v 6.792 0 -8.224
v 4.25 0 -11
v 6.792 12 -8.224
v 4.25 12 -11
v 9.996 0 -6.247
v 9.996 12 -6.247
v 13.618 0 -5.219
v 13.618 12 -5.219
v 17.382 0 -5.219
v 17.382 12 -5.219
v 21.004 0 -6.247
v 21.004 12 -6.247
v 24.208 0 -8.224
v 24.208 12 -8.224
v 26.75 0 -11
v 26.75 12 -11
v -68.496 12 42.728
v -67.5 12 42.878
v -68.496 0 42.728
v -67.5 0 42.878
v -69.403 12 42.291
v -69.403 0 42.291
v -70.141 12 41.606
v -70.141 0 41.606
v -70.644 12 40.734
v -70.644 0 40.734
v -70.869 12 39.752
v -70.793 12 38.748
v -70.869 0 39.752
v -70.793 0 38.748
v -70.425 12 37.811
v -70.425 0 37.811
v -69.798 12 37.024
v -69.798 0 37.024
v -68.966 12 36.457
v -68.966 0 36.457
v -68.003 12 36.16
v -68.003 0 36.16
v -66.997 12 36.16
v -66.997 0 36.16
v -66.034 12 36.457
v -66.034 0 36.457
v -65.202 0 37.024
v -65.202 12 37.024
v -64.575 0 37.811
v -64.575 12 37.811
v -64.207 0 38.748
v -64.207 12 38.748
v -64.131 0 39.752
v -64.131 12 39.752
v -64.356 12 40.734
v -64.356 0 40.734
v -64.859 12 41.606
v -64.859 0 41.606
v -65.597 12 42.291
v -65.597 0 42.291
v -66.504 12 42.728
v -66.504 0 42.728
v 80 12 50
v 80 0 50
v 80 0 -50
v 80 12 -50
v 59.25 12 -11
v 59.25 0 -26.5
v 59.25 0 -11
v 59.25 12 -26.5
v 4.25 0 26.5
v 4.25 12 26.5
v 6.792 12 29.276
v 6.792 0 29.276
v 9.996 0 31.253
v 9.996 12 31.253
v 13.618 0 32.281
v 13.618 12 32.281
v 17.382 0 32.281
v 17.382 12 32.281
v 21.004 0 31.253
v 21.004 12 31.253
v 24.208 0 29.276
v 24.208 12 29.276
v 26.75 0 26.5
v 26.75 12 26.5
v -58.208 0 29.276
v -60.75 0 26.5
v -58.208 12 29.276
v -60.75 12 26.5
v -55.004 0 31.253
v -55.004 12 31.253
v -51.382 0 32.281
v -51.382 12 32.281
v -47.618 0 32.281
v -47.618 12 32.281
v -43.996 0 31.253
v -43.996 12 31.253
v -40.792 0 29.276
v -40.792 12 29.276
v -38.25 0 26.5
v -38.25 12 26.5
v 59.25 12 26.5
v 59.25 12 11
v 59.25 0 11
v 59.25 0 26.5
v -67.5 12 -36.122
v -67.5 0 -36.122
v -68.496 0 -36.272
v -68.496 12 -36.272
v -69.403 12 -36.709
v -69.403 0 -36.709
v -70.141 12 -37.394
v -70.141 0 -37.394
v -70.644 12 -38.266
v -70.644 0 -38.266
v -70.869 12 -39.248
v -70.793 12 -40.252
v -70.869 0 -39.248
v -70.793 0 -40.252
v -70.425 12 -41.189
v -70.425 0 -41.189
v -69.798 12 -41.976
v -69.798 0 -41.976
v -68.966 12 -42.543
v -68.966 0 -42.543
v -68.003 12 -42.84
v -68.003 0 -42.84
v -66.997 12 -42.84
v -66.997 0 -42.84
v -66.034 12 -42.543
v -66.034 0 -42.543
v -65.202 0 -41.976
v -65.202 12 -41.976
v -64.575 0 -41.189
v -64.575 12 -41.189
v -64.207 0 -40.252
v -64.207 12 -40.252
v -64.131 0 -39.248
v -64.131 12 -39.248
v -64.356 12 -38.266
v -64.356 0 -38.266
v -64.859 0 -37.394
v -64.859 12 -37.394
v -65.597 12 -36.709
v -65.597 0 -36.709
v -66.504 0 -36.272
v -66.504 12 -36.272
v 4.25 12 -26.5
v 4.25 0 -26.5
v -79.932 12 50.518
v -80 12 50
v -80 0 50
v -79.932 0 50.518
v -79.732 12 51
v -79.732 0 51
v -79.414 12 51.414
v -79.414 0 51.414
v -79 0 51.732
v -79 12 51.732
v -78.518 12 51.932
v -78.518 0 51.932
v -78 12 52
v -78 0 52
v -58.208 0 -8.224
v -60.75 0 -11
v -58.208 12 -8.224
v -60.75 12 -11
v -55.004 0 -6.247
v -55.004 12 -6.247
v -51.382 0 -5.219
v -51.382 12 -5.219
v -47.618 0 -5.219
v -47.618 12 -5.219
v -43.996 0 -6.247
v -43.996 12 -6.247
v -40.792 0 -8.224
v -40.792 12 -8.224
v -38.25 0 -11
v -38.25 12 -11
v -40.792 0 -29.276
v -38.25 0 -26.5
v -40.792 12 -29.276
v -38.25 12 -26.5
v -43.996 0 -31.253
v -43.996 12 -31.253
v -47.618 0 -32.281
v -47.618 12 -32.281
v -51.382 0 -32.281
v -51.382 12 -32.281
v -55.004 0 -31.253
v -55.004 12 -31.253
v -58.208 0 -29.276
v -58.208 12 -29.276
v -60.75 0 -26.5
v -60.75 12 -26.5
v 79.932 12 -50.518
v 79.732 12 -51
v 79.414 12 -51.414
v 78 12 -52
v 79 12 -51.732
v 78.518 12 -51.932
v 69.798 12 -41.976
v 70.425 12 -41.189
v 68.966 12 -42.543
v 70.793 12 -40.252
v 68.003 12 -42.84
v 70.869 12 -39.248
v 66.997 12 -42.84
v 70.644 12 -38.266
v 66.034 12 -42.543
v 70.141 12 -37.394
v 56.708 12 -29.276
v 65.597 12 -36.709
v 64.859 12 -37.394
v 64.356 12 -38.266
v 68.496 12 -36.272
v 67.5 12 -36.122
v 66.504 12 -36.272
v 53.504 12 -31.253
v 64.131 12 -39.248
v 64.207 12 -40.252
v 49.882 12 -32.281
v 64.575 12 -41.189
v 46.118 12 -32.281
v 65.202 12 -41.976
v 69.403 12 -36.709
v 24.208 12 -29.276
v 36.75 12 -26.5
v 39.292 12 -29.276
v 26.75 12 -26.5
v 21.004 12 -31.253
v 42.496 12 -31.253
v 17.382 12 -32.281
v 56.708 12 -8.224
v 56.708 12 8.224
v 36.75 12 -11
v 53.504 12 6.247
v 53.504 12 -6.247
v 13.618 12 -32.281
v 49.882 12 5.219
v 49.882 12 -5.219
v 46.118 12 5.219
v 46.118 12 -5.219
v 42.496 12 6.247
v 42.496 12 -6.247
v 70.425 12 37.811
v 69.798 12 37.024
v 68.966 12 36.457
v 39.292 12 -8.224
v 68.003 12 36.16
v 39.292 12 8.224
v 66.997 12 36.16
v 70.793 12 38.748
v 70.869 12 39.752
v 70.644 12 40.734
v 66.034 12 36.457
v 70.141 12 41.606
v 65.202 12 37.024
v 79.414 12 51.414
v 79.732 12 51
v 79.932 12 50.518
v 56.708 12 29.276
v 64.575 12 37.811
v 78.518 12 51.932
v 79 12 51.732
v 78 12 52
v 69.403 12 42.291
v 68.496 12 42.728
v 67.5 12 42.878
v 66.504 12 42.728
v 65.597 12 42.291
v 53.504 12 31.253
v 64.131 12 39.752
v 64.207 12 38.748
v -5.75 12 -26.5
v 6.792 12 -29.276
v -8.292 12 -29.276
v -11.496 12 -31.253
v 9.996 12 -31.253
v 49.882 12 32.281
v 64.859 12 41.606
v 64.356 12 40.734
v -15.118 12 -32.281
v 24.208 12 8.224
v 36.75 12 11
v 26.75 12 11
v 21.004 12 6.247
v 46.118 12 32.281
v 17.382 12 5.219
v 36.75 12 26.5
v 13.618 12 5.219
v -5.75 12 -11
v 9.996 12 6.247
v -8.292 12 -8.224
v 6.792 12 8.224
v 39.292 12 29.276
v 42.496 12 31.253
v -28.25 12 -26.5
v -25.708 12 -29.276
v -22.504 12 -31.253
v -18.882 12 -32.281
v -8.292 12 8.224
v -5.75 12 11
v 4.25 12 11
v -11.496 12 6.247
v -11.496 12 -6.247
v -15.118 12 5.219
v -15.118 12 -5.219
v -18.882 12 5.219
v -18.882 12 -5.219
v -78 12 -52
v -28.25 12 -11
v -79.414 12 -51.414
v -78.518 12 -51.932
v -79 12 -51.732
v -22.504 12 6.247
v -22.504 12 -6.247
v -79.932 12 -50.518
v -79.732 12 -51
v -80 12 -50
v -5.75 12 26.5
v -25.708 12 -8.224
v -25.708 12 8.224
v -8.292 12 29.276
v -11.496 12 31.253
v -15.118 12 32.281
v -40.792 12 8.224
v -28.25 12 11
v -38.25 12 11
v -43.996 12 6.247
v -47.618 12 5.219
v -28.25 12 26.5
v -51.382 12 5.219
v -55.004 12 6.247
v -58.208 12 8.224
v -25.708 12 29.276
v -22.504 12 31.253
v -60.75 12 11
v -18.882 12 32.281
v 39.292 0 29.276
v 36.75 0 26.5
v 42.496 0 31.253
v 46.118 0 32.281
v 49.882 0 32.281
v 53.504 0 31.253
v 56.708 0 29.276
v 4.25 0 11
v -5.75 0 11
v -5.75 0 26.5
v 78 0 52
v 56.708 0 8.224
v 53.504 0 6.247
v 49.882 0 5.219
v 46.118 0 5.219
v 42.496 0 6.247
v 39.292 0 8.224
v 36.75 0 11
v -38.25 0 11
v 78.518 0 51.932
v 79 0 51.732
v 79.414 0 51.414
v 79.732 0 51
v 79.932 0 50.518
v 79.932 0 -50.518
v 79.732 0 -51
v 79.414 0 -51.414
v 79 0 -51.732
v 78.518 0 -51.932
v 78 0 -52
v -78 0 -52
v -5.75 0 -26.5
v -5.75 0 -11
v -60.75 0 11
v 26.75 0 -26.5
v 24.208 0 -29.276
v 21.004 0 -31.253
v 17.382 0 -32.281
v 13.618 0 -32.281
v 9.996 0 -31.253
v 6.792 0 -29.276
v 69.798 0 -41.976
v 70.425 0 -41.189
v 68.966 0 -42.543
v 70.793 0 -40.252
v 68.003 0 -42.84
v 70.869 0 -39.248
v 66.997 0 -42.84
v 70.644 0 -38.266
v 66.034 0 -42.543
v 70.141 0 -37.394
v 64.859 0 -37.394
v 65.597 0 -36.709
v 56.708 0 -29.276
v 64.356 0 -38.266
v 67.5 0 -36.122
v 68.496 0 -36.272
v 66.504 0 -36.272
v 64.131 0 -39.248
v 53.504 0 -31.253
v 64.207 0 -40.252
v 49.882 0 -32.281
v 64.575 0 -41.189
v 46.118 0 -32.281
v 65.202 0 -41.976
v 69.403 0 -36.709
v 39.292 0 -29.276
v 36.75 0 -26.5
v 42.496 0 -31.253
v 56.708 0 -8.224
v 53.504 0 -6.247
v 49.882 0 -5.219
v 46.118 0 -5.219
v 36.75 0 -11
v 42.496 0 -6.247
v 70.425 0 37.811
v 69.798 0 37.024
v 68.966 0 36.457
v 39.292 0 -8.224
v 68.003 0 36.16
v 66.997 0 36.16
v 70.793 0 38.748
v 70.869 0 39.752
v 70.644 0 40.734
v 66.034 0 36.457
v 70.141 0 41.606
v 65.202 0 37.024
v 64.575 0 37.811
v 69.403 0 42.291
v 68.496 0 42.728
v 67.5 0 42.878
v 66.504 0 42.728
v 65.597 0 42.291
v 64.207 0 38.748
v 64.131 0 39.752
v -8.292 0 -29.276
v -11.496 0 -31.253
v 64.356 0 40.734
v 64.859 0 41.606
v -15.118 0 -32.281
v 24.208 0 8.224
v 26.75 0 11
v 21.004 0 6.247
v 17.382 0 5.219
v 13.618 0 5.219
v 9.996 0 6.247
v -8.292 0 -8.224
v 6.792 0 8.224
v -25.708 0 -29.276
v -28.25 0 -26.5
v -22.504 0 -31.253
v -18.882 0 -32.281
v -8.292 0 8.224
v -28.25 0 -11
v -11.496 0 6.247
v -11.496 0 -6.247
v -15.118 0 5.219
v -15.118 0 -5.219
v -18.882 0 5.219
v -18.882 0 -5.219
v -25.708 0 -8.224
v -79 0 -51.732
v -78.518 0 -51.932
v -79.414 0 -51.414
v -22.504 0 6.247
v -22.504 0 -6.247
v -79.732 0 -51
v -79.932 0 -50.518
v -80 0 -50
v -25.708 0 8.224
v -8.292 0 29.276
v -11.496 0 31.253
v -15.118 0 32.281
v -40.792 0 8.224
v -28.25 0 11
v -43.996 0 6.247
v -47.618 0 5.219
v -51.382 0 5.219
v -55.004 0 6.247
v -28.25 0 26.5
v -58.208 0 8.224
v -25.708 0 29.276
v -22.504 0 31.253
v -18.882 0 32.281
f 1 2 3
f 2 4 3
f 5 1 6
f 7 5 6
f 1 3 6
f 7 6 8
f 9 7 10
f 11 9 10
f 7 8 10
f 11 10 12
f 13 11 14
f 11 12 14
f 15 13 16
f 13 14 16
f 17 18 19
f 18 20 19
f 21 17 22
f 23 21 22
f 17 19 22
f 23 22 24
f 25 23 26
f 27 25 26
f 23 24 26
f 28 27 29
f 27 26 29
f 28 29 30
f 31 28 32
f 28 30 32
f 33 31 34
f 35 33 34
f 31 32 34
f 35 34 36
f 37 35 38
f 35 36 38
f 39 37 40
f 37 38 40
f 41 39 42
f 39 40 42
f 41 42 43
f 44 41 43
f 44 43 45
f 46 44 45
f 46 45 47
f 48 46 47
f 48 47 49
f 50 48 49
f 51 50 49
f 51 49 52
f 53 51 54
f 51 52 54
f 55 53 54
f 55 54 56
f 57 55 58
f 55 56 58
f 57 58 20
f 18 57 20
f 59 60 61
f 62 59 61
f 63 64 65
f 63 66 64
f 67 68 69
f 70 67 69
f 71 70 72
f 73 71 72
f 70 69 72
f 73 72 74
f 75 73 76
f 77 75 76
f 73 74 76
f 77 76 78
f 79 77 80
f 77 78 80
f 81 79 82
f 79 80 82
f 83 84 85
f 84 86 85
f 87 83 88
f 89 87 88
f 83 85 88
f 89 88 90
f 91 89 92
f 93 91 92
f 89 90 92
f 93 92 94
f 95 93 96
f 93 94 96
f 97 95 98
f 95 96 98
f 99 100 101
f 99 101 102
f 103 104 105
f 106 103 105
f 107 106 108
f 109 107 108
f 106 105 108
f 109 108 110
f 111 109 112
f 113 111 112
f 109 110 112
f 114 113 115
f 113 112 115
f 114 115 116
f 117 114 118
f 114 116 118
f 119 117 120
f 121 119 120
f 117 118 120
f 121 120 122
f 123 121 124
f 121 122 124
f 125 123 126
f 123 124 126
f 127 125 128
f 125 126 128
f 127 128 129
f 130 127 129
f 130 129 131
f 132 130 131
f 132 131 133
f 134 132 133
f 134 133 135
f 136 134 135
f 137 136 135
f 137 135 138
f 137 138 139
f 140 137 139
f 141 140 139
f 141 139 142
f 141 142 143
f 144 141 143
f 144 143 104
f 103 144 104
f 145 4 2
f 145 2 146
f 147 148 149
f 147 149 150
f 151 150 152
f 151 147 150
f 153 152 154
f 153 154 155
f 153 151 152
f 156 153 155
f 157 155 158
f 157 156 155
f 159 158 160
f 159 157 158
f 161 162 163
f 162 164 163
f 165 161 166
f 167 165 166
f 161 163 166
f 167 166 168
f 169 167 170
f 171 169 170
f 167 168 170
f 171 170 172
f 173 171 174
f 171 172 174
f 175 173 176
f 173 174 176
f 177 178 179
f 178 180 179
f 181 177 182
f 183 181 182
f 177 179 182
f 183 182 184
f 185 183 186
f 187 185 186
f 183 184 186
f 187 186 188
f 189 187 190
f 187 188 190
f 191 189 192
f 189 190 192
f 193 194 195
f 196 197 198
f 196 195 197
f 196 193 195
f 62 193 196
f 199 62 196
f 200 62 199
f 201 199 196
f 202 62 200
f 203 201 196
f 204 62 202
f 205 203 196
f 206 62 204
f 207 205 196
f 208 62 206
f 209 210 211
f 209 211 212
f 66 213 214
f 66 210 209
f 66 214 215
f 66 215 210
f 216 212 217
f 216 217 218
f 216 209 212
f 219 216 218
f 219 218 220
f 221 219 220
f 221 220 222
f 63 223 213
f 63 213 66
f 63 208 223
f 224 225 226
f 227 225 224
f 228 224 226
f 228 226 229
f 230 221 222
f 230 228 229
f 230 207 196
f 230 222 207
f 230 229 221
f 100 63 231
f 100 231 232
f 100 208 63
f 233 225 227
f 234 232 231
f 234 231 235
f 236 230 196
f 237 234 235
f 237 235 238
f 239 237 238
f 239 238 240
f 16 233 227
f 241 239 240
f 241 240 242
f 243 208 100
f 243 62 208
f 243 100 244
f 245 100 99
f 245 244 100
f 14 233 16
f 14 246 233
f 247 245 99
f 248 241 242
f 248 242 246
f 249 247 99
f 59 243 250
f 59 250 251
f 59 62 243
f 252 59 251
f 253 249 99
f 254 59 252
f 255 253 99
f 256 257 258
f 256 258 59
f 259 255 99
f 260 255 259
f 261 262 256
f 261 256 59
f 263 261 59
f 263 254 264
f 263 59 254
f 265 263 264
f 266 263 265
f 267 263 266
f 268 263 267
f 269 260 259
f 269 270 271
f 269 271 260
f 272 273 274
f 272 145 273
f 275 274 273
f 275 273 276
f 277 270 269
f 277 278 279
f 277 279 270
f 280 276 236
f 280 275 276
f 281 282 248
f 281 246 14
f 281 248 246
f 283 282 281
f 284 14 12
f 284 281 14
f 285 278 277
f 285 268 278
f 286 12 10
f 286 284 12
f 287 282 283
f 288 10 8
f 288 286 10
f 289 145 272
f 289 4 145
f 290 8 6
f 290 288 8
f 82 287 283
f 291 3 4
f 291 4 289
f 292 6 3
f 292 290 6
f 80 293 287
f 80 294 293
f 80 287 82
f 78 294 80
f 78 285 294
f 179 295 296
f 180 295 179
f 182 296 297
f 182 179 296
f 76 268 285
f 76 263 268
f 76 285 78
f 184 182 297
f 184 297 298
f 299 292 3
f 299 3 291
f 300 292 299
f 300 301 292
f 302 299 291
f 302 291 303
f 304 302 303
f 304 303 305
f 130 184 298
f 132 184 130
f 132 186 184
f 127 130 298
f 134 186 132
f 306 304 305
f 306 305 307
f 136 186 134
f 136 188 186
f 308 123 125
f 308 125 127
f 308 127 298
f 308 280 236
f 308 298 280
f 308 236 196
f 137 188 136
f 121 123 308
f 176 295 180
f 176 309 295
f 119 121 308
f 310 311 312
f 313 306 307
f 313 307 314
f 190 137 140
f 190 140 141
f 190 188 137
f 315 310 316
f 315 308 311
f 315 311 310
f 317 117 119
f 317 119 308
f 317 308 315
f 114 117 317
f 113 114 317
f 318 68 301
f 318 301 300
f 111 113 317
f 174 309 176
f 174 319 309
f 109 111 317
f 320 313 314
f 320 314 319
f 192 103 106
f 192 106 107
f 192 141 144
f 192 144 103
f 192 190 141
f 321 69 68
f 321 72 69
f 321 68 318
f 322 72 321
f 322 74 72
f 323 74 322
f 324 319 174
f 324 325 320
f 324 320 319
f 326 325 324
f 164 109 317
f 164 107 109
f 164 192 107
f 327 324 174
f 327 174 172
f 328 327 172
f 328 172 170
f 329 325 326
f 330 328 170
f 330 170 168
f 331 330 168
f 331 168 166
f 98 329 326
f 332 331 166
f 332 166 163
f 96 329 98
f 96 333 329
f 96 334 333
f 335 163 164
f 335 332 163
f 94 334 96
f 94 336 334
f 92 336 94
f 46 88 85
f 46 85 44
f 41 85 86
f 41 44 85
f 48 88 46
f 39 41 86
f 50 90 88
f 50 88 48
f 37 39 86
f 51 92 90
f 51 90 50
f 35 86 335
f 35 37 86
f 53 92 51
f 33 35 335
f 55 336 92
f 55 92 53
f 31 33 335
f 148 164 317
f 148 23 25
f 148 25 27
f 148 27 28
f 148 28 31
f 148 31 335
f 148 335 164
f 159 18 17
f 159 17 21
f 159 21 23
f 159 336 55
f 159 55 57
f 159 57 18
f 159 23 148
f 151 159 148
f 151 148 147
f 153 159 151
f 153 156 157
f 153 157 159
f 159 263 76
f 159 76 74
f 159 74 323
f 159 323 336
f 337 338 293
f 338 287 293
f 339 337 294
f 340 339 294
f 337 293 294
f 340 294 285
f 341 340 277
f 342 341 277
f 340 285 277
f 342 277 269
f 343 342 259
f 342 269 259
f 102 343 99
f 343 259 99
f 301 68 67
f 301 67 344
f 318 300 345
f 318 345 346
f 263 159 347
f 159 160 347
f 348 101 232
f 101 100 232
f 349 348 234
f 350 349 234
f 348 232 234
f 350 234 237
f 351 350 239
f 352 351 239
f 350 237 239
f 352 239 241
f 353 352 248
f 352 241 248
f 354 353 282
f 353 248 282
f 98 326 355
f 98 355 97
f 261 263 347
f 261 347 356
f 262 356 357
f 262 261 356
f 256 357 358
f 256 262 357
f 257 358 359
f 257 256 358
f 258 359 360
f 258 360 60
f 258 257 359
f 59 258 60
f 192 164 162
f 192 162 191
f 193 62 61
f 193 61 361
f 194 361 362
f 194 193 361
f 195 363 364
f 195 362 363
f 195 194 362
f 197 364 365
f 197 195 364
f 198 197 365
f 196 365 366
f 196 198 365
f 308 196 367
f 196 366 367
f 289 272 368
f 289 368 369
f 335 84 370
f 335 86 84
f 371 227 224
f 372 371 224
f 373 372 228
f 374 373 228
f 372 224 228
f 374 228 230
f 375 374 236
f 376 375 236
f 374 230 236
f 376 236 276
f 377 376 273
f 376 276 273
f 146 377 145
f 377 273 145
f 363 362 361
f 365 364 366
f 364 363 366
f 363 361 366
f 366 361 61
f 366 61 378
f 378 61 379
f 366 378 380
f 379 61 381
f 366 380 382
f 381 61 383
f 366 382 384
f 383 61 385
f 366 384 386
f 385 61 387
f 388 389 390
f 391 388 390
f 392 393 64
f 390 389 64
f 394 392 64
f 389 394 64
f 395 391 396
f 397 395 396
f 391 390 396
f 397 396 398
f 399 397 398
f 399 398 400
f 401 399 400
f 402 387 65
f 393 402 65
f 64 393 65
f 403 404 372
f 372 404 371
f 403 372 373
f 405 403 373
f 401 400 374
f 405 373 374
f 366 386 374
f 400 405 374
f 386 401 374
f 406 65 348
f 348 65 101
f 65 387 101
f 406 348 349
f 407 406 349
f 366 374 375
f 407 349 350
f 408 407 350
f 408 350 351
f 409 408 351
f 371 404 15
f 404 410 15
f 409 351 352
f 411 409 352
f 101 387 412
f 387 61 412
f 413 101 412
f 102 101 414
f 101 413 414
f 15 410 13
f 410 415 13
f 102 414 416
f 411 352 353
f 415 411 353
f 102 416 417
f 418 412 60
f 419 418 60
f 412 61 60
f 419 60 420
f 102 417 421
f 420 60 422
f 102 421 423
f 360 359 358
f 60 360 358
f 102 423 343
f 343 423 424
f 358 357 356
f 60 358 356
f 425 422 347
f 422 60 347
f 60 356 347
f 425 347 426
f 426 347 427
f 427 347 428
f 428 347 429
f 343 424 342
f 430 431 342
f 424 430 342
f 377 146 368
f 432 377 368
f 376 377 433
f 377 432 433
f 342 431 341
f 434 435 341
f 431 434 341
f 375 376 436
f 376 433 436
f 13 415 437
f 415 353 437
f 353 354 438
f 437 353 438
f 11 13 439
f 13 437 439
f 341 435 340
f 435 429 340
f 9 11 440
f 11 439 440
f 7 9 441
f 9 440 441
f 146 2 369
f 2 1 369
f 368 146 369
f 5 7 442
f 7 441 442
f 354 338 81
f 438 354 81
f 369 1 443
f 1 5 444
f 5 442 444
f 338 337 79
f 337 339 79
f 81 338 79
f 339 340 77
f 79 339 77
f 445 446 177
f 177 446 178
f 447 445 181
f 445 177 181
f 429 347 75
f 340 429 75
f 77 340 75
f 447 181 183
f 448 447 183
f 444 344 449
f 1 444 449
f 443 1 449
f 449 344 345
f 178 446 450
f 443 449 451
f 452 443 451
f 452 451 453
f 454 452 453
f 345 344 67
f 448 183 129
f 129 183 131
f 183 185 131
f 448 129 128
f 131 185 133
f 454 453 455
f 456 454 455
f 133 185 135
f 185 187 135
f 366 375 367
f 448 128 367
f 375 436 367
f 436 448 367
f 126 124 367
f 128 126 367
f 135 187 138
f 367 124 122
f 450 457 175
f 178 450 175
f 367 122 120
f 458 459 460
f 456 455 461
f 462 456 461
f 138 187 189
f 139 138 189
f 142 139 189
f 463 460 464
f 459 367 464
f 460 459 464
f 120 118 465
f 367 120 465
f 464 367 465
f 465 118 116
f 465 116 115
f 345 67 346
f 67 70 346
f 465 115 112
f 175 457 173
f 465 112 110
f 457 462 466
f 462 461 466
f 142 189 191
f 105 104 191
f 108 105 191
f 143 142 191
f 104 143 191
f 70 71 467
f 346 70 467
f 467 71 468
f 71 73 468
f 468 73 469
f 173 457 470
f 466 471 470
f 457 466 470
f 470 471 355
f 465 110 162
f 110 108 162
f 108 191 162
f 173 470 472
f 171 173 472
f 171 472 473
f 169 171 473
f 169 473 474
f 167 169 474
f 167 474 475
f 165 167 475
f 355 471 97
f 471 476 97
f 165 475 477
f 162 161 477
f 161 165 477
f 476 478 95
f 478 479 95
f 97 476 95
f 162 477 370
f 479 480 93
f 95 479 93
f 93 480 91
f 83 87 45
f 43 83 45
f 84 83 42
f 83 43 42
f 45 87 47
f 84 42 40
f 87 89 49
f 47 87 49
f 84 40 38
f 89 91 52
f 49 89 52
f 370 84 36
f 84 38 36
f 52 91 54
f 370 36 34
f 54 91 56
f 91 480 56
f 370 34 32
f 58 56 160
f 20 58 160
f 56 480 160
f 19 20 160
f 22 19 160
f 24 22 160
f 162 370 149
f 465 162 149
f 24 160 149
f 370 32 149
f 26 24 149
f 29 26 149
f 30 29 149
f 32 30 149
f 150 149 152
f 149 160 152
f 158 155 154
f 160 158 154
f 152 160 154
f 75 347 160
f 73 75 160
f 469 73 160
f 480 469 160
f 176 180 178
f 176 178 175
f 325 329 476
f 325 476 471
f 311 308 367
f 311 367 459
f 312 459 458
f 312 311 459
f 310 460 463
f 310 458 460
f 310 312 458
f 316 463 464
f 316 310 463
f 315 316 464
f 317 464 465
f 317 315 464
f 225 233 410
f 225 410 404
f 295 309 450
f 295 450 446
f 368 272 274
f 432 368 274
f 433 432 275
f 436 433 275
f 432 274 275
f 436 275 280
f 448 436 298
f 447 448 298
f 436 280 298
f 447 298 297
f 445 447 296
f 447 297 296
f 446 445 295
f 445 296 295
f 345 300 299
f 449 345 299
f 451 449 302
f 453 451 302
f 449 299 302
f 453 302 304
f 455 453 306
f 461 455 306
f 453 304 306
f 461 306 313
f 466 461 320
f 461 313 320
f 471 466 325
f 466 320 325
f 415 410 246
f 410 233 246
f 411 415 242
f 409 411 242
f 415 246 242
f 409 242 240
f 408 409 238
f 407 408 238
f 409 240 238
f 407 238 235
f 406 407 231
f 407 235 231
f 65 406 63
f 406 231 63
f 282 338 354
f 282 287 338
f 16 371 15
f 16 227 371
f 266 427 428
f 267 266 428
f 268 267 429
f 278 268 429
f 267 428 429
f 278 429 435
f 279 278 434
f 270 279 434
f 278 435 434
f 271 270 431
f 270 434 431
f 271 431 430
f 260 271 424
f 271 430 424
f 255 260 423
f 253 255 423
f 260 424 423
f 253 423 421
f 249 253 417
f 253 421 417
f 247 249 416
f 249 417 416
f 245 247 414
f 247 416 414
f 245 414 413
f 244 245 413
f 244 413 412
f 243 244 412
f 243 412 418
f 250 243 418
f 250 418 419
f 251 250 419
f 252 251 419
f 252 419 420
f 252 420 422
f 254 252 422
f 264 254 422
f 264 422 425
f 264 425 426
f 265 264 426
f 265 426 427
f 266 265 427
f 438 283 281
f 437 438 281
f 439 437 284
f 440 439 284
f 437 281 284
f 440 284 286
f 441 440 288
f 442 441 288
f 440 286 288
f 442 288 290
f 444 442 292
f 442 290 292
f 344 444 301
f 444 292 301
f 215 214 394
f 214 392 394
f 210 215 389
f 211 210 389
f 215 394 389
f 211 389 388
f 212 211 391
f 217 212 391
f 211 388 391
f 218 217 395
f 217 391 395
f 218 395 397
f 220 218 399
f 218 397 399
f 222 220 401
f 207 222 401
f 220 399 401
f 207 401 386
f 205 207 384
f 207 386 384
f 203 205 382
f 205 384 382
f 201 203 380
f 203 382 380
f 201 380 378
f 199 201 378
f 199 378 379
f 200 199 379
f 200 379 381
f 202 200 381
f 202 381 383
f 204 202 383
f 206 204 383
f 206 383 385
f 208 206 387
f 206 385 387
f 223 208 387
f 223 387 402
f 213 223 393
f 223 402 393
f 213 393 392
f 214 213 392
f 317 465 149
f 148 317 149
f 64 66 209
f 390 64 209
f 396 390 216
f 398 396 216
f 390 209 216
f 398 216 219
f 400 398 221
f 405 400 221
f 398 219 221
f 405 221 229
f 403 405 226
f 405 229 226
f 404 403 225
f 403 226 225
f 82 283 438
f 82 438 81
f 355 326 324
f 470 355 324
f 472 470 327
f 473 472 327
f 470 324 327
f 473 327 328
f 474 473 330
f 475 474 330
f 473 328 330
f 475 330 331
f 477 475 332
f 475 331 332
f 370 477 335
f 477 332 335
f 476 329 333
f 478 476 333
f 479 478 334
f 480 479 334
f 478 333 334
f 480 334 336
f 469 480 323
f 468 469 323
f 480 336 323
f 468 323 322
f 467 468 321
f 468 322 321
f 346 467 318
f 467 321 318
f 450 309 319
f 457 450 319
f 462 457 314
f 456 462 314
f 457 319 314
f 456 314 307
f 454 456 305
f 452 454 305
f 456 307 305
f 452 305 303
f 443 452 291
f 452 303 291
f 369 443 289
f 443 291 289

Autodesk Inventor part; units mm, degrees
ref_plane "YZ Plane" through (0, 0, 0) normal (1, 0, 0) x (0, 1, 0)
ref_plane "XZ Plane" through (0, 0, 0) normal (0, 1, 0) x (-1, 0, 0)
ref_plane "XY Plane" through (0, 0, 0) normal (0, 0, 1) x (1, 0, 0)
sketch "Sketch1" plane through (0, 0, 0) normal (0, 1, 0) x (-1, 0, 0)
  line L0 (80, 52) -> (-80, 52)
  line L1 (-80, 52) -> (-80, -52)
  line L2 (-80, -52) -> (80, -52)
  line L3 (80, -52) -> (80, 52)
  line L4 (80, 52) -> (-80, -52) construction
  line L5 (-80, 52) -> (80, -52) construction
  point P0 (0, 0)
  dimension "d0" = 160
  dimension "d1" = 104
extrude "Extrusion1" add sketch "Sketch1" along normal blind 12
sketch "Sketch2" plane through (0, 12, 0) normal (0, 1, 0) x (1, 0, 0)
  line L0 (-80, 52) -> (-80, -52) projected
  line L1 (80, 52) -> (-80, 52) projected
  line L2 (-38.25, 26.5) -> (-38.25, 11)
  line L3 (-60.75, 11) -> (-60.75, 26.5)
  arc A0 (-38.25, 26.5) -> (-60.75, 26.5) centre (-49.5, 18.75) ccw
  arc A1 (-60.75, 11) -> (-38.25, 11) centre (-49.5, 18.75) ccw
  point P0 (0, 0)
  dimension "d33" = 22.5
  dimension "d34" = 15.5
  dimension "d35" = 19.25
  dimension "d37" = 33.25
  dimension "d38" = 7.75
extrude "Extrusion2" cut sketch "Sketch2" against normal up to next
pattern_linear "Rectangular Pattern1" count 4 spacing -32.5 along (-1, 0, 0) count 2 spacing 37.5 along (0, 0, 1) of "Extrusion2"
sketch "Sketch4" plane through (0, 12, 0) normal (0, 1, 0) x (1, 0, 0)
  line L0 (-80, 52) -> (-80, -52) projected
  line L1 (80, 52) -> (-80, 52) projected
  line L2 (80, -52) -> (80, 52) projected
  line L3 (-80, -52) -> (80, -52) projected
  point P0 (0, 0)
  point P1 (-67.5, 39.5)
  point P2 (67.5, 39.5)
  point P3 (67.5, -39.5)
  point P4 (-67.5, -39.5)
  dimension "d24" = 12.5
  dimension "d25" = 12.5
  dimension "d26" = 12.5
  dimension "d27" = 12.5
  dimension "d28" = 12.5
  dimension "d29" = 12.5
  dimension "d30" = 12.5
  dimension "d31" = 12.5
hole "Hole1" at (-67.5, 12, -39.5) at (67.5, 12, -39.5) at (67.5, 12, 39.5) at (-67.5, 12, 39.5) direction (0, -1, 0) diameter 6.756 depth 25.4 clearance for "Socket Head Cap Screw" size "1/4" standard "Ansi Unified Screw Threads"
fillet "Fillet1" radius 2 4 edges at (-80, 6, 52) (80, 6, 52) (80, 6, -52) (-80, 6, -52)
properties part number "4_OM_VialPlate_0.5mmReduce"
